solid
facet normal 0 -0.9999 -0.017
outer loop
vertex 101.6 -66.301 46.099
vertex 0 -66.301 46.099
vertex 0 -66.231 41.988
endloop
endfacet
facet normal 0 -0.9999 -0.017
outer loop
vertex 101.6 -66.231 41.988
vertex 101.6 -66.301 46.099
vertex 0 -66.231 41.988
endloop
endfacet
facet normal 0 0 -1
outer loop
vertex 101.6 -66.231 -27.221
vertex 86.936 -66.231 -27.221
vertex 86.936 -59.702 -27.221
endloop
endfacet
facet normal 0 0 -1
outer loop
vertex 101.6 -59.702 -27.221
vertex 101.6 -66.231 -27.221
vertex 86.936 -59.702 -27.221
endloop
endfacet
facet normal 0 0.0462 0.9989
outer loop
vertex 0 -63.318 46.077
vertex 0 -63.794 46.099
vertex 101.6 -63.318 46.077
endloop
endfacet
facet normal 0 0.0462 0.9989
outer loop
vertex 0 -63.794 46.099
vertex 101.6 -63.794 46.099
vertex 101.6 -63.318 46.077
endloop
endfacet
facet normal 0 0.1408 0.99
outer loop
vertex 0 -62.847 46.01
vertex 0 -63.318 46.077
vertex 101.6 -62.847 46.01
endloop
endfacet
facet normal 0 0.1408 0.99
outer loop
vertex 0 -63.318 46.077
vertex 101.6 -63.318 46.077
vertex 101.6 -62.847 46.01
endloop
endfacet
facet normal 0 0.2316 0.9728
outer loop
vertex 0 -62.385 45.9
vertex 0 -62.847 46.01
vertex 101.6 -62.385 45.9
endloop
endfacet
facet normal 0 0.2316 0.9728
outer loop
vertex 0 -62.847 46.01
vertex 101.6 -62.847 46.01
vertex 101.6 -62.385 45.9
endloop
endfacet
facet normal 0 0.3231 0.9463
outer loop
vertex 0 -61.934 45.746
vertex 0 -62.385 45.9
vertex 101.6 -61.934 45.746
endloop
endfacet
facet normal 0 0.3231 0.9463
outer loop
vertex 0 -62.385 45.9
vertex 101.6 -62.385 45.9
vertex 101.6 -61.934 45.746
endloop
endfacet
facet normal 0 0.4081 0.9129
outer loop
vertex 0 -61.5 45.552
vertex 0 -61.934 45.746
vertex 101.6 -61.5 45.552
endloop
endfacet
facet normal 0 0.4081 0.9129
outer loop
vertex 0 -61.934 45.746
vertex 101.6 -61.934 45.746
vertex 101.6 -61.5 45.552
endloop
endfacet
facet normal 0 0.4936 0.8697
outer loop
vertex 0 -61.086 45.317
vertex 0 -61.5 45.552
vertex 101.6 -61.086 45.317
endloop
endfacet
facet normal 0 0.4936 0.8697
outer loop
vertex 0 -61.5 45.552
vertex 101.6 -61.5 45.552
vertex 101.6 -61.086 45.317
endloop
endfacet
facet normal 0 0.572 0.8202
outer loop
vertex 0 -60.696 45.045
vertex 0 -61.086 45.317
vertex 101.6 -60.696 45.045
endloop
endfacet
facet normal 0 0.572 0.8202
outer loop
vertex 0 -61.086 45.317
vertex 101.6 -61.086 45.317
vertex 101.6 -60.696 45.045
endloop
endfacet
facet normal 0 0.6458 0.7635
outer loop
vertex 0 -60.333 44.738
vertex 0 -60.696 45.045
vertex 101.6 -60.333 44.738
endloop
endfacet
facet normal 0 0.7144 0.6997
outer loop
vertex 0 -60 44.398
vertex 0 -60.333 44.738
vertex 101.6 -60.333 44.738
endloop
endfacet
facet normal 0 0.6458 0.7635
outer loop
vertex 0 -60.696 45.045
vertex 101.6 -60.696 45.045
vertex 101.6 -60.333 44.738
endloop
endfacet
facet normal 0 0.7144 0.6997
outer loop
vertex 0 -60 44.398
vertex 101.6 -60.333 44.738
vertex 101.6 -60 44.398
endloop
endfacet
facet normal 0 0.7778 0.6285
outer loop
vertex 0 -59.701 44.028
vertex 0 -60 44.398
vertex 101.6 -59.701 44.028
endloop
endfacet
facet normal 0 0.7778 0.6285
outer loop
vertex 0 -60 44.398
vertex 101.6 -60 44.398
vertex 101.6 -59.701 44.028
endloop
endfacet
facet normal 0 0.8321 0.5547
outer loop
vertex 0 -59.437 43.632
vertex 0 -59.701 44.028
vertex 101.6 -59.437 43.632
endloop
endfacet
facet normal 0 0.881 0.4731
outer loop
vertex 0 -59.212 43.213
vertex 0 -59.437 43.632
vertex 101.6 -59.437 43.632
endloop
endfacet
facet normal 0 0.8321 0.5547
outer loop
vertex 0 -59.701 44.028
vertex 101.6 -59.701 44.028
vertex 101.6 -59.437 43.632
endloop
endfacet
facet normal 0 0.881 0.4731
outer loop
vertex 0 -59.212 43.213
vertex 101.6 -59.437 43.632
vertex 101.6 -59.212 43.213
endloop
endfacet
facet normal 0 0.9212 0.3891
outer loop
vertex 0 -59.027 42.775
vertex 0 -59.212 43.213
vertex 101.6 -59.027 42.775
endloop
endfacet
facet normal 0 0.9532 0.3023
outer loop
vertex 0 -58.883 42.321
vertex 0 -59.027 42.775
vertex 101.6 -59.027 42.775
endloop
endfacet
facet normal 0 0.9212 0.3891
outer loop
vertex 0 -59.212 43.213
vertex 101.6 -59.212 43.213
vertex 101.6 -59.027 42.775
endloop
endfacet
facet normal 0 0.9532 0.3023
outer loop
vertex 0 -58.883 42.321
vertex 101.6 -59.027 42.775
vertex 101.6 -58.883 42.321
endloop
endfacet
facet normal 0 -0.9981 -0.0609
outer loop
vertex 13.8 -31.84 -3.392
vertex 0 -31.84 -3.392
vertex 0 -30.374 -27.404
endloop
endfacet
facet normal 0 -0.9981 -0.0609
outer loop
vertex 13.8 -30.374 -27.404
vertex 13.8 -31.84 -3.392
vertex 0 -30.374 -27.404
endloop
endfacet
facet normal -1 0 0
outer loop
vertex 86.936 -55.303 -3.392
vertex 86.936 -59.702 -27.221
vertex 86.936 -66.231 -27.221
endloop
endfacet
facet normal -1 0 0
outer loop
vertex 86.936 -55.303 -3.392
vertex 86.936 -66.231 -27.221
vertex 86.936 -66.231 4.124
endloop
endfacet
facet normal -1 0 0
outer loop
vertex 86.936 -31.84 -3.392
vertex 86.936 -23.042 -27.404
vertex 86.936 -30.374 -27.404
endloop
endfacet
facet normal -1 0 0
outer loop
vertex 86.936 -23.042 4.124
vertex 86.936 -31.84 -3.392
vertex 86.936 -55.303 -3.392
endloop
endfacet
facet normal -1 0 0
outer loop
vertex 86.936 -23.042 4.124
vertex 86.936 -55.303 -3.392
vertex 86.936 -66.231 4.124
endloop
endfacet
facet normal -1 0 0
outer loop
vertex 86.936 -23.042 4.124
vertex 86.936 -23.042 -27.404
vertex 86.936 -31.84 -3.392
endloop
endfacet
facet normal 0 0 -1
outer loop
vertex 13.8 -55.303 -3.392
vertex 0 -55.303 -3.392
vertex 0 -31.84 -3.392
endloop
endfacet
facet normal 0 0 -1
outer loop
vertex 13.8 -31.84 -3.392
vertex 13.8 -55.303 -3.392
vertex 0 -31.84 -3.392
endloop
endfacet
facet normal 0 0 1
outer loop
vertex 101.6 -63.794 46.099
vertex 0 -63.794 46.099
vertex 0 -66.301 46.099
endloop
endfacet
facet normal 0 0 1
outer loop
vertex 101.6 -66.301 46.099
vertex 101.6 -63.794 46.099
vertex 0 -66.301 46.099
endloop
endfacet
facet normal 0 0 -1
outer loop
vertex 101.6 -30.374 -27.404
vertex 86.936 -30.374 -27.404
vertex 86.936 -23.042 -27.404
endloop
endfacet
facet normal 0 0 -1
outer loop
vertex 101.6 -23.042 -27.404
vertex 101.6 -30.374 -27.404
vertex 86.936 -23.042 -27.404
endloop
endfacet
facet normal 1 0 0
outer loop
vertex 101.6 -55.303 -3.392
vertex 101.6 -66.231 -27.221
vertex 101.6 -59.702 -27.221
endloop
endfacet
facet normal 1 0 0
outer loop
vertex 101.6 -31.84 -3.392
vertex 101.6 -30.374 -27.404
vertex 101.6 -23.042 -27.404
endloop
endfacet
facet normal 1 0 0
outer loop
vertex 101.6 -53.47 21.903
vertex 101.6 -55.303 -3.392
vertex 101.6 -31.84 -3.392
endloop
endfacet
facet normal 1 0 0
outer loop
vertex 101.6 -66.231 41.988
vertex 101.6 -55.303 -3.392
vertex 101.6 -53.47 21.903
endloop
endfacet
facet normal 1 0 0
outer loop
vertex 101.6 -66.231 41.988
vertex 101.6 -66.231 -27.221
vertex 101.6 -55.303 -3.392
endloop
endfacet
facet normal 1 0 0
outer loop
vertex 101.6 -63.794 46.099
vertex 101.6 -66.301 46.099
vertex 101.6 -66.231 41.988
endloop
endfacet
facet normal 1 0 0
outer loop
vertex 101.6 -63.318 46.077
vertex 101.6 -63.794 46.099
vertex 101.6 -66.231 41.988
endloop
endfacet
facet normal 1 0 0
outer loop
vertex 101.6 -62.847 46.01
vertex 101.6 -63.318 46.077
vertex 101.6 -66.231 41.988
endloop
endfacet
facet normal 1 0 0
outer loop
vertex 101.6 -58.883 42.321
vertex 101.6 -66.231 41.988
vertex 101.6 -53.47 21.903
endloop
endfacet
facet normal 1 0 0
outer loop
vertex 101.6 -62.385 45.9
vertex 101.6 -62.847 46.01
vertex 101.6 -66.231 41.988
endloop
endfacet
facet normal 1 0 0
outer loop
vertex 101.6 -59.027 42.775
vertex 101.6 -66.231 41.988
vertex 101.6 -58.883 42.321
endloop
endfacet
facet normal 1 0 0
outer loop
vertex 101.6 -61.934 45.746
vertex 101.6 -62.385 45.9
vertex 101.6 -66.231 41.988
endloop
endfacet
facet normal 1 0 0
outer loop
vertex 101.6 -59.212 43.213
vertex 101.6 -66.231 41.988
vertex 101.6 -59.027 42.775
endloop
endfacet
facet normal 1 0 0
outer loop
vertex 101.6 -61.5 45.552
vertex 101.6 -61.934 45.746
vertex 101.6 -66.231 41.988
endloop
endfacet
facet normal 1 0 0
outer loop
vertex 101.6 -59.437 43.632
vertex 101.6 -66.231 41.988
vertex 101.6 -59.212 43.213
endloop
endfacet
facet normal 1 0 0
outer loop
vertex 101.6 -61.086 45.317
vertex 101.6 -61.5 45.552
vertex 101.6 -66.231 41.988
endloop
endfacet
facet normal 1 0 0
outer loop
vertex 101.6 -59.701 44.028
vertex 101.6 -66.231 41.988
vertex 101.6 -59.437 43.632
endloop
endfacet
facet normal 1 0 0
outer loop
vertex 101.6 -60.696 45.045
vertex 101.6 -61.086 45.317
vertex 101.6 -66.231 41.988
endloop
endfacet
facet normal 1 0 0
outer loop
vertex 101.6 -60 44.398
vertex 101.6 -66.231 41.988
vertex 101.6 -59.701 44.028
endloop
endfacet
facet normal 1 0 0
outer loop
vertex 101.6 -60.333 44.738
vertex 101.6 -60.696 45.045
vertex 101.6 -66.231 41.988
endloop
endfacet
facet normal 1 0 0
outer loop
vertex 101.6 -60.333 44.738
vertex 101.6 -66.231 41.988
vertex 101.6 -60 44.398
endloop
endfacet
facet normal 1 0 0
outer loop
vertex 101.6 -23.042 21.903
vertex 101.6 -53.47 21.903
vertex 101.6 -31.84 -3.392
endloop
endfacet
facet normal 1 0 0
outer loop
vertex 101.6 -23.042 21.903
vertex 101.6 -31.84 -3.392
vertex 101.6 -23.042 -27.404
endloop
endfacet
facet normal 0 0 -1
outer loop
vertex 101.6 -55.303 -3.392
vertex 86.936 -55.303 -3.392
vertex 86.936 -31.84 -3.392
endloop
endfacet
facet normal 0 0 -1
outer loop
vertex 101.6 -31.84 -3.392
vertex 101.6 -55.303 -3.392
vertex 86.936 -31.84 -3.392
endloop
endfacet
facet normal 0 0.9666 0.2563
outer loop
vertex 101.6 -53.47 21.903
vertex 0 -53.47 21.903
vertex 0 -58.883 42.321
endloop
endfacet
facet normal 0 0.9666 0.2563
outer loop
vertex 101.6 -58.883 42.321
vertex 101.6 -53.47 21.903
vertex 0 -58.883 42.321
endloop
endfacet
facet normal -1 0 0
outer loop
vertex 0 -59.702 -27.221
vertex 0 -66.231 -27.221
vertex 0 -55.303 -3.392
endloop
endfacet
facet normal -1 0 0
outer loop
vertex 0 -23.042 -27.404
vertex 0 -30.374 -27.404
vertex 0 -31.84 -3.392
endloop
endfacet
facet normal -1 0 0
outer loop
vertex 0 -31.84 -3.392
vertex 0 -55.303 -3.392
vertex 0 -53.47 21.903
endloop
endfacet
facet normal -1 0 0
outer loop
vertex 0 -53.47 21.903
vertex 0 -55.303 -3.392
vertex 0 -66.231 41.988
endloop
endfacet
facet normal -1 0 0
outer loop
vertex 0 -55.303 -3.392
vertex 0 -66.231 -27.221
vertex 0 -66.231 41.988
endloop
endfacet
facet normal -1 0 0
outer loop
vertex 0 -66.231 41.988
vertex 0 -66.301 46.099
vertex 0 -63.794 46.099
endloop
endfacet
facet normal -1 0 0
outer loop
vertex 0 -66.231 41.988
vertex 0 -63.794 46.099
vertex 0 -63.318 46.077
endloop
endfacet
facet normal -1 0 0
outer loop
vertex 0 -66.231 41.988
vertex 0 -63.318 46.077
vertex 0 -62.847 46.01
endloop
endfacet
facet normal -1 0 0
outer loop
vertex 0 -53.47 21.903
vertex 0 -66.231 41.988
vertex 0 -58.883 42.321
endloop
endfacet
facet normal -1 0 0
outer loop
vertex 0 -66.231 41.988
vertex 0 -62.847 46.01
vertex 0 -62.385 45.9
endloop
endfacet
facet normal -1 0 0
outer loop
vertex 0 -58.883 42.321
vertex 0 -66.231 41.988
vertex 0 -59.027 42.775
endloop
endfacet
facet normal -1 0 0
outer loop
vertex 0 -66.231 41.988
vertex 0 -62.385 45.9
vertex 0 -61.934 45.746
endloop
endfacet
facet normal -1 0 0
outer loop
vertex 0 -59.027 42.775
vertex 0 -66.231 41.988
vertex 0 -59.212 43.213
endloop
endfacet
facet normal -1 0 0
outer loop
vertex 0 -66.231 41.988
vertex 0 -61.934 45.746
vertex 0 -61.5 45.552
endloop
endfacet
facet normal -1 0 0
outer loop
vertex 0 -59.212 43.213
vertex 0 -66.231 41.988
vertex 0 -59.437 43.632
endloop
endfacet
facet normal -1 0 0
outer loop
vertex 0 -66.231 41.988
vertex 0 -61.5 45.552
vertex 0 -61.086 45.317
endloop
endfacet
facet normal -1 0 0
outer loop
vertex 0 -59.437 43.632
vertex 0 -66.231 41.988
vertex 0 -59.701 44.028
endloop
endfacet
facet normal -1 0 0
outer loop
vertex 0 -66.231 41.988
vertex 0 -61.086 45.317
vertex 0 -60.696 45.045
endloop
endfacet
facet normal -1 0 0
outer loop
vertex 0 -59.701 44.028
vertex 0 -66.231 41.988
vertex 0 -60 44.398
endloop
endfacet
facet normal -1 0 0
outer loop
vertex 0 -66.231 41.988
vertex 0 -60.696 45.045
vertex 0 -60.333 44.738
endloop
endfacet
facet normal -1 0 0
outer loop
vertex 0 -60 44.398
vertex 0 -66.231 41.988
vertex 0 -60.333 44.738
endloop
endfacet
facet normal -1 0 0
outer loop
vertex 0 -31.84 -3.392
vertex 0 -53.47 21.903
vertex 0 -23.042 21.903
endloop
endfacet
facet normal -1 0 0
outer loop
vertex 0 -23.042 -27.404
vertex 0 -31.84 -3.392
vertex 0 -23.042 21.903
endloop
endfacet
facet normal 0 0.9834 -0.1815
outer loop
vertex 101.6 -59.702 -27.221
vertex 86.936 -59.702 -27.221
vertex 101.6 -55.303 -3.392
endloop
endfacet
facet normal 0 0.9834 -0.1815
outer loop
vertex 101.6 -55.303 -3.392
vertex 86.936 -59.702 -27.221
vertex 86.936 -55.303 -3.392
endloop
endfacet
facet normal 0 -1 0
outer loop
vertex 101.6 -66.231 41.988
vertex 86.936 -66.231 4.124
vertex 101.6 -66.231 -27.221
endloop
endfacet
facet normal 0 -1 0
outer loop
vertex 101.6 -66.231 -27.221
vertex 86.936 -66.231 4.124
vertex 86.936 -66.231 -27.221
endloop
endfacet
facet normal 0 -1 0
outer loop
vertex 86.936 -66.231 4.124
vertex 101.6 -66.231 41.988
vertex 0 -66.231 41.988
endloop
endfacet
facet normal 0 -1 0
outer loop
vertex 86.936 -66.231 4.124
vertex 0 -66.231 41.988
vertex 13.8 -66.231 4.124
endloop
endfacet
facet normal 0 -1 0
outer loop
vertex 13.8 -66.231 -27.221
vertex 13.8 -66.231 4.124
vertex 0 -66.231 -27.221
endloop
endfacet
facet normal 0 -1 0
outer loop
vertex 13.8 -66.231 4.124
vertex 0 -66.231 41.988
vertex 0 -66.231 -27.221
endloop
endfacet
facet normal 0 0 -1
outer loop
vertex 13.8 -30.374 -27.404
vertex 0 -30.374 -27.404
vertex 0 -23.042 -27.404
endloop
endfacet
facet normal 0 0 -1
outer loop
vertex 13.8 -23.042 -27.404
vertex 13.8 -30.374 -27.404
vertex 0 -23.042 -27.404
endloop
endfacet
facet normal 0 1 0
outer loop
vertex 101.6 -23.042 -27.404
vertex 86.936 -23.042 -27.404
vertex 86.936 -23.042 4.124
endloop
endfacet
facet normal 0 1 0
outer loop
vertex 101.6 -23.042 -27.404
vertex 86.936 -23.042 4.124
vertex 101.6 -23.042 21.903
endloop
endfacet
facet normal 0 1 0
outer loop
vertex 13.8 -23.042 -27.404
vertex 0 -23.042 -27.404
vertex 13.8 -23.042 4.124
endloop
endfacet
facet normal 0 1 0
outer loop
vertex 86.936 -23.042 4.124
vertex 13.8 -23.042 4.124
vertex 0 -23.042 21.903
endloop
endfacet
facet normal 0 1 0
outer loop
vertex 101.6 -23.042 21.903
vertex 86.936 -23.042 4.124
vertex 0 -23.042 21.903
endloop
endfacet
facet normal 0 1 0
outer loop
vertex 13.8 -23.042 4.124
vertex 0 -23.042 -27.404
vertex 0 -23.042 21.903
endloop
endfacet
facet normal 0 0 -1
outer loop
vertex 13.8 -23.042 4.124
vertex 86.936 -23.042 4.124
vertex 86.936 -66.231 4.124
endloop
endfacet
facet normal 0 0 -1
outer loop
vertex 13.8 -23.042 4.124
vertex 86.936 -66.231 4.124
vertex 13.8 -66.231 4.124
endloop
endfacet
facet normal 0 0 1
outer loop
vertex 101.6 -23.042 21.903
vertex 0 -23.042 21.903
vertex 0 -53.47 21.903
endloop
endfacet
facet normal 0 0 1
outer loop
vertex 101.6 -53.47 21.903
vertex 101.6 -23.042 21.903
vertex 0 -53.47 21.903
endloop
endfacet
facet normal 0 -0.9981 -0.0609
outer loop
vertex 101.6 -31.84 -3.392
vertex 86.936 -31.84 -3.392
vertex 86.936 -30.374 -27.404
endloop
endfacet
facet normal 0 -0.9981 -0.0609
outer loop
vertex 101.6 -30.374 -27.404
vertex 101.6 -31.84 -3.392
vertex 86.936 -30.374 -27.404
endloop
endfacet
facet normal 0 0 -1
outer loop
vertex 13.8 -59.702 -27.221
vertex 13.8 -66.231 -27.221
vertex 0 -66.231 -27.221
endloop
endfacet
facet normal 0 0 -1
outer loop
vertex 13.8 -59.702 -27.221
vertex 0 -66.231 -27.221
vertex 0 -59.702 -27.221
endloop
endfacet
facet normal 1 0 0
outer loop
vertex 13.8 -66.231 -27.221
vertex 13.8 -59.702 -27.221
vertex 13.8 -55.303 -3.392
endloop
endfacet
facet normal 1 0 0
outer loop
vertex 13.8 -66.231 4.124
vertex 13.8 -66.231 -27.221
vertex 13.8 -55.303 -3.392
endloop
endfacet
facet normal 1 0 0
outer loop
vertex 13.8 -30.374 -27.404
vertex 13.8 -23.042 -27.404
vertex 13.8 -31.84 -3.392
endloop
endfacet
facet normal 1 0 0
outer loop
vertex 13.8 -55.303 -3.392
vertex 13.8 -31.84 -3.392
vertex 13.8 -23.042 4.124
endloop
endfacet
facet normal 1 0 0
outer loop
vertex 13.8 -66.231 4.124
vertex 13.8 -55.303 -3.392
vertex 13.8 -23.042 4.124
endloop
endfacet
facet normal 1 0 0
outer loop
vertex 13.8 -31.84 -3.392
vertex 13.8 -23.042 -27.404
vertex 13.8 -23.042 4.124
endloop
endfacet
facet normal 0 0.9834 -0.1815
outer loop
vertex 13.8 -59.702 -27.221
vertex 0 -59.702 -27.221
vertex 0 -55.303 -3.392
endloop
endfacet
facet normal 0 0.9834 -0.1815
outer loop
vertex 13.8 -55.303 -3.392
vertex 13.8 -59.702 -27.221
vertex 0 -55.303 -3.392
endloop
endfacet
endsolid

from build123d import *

# Parameters (mm, degrees)
F1_DEPTH = 101.6
F2_W     = 73.136294
F2_H     = 31.528215
F3_DEPTH = 43.25955
F4_R     = 5.08


with BuildPart() as f1:
    # F0 (on Right) → F1 (new body)
    with BuildSketch(Plane.YZ):
        Polygon((-66.300608, 46.098899), (-66.231251, 41.988105), (-66.231251, -27.220687), (-59.701849, -27.220687), (-55.302672, -3.391821), (-31.840406, -3.391821), (-30.374017, -27.403988), (-23.042059, -27.403988), (-23.042059, -3.025223), (-23.042059, 21.903437), (-53.469684, 21.903437), (-59.885152, 46.098899), align=None)
    extrude(amount=F1_DEPTH)

    # F2 (on face) → F3 (cut, through all)
    with BuildSketch(Plane(origin=(0, -23.042059, 0), x_dir=(-1, 0, 0), z_dir=(0, 1, 0))):
        with Locations((-50.367939, -11.639881)):
            Rectangle(F2_W, F2_H)
    extrude(amount=-F3_DEPTH, mode=Mode.SUBTRACT)

    # F4
    f4_edges = [f1.edges().sort_by_distance(p)[0] for p in [
        (50.8, -59.885152, 46.098899),
    ]]
    fillet(f4_edges, radius=F4_R)


solid = f1.part
